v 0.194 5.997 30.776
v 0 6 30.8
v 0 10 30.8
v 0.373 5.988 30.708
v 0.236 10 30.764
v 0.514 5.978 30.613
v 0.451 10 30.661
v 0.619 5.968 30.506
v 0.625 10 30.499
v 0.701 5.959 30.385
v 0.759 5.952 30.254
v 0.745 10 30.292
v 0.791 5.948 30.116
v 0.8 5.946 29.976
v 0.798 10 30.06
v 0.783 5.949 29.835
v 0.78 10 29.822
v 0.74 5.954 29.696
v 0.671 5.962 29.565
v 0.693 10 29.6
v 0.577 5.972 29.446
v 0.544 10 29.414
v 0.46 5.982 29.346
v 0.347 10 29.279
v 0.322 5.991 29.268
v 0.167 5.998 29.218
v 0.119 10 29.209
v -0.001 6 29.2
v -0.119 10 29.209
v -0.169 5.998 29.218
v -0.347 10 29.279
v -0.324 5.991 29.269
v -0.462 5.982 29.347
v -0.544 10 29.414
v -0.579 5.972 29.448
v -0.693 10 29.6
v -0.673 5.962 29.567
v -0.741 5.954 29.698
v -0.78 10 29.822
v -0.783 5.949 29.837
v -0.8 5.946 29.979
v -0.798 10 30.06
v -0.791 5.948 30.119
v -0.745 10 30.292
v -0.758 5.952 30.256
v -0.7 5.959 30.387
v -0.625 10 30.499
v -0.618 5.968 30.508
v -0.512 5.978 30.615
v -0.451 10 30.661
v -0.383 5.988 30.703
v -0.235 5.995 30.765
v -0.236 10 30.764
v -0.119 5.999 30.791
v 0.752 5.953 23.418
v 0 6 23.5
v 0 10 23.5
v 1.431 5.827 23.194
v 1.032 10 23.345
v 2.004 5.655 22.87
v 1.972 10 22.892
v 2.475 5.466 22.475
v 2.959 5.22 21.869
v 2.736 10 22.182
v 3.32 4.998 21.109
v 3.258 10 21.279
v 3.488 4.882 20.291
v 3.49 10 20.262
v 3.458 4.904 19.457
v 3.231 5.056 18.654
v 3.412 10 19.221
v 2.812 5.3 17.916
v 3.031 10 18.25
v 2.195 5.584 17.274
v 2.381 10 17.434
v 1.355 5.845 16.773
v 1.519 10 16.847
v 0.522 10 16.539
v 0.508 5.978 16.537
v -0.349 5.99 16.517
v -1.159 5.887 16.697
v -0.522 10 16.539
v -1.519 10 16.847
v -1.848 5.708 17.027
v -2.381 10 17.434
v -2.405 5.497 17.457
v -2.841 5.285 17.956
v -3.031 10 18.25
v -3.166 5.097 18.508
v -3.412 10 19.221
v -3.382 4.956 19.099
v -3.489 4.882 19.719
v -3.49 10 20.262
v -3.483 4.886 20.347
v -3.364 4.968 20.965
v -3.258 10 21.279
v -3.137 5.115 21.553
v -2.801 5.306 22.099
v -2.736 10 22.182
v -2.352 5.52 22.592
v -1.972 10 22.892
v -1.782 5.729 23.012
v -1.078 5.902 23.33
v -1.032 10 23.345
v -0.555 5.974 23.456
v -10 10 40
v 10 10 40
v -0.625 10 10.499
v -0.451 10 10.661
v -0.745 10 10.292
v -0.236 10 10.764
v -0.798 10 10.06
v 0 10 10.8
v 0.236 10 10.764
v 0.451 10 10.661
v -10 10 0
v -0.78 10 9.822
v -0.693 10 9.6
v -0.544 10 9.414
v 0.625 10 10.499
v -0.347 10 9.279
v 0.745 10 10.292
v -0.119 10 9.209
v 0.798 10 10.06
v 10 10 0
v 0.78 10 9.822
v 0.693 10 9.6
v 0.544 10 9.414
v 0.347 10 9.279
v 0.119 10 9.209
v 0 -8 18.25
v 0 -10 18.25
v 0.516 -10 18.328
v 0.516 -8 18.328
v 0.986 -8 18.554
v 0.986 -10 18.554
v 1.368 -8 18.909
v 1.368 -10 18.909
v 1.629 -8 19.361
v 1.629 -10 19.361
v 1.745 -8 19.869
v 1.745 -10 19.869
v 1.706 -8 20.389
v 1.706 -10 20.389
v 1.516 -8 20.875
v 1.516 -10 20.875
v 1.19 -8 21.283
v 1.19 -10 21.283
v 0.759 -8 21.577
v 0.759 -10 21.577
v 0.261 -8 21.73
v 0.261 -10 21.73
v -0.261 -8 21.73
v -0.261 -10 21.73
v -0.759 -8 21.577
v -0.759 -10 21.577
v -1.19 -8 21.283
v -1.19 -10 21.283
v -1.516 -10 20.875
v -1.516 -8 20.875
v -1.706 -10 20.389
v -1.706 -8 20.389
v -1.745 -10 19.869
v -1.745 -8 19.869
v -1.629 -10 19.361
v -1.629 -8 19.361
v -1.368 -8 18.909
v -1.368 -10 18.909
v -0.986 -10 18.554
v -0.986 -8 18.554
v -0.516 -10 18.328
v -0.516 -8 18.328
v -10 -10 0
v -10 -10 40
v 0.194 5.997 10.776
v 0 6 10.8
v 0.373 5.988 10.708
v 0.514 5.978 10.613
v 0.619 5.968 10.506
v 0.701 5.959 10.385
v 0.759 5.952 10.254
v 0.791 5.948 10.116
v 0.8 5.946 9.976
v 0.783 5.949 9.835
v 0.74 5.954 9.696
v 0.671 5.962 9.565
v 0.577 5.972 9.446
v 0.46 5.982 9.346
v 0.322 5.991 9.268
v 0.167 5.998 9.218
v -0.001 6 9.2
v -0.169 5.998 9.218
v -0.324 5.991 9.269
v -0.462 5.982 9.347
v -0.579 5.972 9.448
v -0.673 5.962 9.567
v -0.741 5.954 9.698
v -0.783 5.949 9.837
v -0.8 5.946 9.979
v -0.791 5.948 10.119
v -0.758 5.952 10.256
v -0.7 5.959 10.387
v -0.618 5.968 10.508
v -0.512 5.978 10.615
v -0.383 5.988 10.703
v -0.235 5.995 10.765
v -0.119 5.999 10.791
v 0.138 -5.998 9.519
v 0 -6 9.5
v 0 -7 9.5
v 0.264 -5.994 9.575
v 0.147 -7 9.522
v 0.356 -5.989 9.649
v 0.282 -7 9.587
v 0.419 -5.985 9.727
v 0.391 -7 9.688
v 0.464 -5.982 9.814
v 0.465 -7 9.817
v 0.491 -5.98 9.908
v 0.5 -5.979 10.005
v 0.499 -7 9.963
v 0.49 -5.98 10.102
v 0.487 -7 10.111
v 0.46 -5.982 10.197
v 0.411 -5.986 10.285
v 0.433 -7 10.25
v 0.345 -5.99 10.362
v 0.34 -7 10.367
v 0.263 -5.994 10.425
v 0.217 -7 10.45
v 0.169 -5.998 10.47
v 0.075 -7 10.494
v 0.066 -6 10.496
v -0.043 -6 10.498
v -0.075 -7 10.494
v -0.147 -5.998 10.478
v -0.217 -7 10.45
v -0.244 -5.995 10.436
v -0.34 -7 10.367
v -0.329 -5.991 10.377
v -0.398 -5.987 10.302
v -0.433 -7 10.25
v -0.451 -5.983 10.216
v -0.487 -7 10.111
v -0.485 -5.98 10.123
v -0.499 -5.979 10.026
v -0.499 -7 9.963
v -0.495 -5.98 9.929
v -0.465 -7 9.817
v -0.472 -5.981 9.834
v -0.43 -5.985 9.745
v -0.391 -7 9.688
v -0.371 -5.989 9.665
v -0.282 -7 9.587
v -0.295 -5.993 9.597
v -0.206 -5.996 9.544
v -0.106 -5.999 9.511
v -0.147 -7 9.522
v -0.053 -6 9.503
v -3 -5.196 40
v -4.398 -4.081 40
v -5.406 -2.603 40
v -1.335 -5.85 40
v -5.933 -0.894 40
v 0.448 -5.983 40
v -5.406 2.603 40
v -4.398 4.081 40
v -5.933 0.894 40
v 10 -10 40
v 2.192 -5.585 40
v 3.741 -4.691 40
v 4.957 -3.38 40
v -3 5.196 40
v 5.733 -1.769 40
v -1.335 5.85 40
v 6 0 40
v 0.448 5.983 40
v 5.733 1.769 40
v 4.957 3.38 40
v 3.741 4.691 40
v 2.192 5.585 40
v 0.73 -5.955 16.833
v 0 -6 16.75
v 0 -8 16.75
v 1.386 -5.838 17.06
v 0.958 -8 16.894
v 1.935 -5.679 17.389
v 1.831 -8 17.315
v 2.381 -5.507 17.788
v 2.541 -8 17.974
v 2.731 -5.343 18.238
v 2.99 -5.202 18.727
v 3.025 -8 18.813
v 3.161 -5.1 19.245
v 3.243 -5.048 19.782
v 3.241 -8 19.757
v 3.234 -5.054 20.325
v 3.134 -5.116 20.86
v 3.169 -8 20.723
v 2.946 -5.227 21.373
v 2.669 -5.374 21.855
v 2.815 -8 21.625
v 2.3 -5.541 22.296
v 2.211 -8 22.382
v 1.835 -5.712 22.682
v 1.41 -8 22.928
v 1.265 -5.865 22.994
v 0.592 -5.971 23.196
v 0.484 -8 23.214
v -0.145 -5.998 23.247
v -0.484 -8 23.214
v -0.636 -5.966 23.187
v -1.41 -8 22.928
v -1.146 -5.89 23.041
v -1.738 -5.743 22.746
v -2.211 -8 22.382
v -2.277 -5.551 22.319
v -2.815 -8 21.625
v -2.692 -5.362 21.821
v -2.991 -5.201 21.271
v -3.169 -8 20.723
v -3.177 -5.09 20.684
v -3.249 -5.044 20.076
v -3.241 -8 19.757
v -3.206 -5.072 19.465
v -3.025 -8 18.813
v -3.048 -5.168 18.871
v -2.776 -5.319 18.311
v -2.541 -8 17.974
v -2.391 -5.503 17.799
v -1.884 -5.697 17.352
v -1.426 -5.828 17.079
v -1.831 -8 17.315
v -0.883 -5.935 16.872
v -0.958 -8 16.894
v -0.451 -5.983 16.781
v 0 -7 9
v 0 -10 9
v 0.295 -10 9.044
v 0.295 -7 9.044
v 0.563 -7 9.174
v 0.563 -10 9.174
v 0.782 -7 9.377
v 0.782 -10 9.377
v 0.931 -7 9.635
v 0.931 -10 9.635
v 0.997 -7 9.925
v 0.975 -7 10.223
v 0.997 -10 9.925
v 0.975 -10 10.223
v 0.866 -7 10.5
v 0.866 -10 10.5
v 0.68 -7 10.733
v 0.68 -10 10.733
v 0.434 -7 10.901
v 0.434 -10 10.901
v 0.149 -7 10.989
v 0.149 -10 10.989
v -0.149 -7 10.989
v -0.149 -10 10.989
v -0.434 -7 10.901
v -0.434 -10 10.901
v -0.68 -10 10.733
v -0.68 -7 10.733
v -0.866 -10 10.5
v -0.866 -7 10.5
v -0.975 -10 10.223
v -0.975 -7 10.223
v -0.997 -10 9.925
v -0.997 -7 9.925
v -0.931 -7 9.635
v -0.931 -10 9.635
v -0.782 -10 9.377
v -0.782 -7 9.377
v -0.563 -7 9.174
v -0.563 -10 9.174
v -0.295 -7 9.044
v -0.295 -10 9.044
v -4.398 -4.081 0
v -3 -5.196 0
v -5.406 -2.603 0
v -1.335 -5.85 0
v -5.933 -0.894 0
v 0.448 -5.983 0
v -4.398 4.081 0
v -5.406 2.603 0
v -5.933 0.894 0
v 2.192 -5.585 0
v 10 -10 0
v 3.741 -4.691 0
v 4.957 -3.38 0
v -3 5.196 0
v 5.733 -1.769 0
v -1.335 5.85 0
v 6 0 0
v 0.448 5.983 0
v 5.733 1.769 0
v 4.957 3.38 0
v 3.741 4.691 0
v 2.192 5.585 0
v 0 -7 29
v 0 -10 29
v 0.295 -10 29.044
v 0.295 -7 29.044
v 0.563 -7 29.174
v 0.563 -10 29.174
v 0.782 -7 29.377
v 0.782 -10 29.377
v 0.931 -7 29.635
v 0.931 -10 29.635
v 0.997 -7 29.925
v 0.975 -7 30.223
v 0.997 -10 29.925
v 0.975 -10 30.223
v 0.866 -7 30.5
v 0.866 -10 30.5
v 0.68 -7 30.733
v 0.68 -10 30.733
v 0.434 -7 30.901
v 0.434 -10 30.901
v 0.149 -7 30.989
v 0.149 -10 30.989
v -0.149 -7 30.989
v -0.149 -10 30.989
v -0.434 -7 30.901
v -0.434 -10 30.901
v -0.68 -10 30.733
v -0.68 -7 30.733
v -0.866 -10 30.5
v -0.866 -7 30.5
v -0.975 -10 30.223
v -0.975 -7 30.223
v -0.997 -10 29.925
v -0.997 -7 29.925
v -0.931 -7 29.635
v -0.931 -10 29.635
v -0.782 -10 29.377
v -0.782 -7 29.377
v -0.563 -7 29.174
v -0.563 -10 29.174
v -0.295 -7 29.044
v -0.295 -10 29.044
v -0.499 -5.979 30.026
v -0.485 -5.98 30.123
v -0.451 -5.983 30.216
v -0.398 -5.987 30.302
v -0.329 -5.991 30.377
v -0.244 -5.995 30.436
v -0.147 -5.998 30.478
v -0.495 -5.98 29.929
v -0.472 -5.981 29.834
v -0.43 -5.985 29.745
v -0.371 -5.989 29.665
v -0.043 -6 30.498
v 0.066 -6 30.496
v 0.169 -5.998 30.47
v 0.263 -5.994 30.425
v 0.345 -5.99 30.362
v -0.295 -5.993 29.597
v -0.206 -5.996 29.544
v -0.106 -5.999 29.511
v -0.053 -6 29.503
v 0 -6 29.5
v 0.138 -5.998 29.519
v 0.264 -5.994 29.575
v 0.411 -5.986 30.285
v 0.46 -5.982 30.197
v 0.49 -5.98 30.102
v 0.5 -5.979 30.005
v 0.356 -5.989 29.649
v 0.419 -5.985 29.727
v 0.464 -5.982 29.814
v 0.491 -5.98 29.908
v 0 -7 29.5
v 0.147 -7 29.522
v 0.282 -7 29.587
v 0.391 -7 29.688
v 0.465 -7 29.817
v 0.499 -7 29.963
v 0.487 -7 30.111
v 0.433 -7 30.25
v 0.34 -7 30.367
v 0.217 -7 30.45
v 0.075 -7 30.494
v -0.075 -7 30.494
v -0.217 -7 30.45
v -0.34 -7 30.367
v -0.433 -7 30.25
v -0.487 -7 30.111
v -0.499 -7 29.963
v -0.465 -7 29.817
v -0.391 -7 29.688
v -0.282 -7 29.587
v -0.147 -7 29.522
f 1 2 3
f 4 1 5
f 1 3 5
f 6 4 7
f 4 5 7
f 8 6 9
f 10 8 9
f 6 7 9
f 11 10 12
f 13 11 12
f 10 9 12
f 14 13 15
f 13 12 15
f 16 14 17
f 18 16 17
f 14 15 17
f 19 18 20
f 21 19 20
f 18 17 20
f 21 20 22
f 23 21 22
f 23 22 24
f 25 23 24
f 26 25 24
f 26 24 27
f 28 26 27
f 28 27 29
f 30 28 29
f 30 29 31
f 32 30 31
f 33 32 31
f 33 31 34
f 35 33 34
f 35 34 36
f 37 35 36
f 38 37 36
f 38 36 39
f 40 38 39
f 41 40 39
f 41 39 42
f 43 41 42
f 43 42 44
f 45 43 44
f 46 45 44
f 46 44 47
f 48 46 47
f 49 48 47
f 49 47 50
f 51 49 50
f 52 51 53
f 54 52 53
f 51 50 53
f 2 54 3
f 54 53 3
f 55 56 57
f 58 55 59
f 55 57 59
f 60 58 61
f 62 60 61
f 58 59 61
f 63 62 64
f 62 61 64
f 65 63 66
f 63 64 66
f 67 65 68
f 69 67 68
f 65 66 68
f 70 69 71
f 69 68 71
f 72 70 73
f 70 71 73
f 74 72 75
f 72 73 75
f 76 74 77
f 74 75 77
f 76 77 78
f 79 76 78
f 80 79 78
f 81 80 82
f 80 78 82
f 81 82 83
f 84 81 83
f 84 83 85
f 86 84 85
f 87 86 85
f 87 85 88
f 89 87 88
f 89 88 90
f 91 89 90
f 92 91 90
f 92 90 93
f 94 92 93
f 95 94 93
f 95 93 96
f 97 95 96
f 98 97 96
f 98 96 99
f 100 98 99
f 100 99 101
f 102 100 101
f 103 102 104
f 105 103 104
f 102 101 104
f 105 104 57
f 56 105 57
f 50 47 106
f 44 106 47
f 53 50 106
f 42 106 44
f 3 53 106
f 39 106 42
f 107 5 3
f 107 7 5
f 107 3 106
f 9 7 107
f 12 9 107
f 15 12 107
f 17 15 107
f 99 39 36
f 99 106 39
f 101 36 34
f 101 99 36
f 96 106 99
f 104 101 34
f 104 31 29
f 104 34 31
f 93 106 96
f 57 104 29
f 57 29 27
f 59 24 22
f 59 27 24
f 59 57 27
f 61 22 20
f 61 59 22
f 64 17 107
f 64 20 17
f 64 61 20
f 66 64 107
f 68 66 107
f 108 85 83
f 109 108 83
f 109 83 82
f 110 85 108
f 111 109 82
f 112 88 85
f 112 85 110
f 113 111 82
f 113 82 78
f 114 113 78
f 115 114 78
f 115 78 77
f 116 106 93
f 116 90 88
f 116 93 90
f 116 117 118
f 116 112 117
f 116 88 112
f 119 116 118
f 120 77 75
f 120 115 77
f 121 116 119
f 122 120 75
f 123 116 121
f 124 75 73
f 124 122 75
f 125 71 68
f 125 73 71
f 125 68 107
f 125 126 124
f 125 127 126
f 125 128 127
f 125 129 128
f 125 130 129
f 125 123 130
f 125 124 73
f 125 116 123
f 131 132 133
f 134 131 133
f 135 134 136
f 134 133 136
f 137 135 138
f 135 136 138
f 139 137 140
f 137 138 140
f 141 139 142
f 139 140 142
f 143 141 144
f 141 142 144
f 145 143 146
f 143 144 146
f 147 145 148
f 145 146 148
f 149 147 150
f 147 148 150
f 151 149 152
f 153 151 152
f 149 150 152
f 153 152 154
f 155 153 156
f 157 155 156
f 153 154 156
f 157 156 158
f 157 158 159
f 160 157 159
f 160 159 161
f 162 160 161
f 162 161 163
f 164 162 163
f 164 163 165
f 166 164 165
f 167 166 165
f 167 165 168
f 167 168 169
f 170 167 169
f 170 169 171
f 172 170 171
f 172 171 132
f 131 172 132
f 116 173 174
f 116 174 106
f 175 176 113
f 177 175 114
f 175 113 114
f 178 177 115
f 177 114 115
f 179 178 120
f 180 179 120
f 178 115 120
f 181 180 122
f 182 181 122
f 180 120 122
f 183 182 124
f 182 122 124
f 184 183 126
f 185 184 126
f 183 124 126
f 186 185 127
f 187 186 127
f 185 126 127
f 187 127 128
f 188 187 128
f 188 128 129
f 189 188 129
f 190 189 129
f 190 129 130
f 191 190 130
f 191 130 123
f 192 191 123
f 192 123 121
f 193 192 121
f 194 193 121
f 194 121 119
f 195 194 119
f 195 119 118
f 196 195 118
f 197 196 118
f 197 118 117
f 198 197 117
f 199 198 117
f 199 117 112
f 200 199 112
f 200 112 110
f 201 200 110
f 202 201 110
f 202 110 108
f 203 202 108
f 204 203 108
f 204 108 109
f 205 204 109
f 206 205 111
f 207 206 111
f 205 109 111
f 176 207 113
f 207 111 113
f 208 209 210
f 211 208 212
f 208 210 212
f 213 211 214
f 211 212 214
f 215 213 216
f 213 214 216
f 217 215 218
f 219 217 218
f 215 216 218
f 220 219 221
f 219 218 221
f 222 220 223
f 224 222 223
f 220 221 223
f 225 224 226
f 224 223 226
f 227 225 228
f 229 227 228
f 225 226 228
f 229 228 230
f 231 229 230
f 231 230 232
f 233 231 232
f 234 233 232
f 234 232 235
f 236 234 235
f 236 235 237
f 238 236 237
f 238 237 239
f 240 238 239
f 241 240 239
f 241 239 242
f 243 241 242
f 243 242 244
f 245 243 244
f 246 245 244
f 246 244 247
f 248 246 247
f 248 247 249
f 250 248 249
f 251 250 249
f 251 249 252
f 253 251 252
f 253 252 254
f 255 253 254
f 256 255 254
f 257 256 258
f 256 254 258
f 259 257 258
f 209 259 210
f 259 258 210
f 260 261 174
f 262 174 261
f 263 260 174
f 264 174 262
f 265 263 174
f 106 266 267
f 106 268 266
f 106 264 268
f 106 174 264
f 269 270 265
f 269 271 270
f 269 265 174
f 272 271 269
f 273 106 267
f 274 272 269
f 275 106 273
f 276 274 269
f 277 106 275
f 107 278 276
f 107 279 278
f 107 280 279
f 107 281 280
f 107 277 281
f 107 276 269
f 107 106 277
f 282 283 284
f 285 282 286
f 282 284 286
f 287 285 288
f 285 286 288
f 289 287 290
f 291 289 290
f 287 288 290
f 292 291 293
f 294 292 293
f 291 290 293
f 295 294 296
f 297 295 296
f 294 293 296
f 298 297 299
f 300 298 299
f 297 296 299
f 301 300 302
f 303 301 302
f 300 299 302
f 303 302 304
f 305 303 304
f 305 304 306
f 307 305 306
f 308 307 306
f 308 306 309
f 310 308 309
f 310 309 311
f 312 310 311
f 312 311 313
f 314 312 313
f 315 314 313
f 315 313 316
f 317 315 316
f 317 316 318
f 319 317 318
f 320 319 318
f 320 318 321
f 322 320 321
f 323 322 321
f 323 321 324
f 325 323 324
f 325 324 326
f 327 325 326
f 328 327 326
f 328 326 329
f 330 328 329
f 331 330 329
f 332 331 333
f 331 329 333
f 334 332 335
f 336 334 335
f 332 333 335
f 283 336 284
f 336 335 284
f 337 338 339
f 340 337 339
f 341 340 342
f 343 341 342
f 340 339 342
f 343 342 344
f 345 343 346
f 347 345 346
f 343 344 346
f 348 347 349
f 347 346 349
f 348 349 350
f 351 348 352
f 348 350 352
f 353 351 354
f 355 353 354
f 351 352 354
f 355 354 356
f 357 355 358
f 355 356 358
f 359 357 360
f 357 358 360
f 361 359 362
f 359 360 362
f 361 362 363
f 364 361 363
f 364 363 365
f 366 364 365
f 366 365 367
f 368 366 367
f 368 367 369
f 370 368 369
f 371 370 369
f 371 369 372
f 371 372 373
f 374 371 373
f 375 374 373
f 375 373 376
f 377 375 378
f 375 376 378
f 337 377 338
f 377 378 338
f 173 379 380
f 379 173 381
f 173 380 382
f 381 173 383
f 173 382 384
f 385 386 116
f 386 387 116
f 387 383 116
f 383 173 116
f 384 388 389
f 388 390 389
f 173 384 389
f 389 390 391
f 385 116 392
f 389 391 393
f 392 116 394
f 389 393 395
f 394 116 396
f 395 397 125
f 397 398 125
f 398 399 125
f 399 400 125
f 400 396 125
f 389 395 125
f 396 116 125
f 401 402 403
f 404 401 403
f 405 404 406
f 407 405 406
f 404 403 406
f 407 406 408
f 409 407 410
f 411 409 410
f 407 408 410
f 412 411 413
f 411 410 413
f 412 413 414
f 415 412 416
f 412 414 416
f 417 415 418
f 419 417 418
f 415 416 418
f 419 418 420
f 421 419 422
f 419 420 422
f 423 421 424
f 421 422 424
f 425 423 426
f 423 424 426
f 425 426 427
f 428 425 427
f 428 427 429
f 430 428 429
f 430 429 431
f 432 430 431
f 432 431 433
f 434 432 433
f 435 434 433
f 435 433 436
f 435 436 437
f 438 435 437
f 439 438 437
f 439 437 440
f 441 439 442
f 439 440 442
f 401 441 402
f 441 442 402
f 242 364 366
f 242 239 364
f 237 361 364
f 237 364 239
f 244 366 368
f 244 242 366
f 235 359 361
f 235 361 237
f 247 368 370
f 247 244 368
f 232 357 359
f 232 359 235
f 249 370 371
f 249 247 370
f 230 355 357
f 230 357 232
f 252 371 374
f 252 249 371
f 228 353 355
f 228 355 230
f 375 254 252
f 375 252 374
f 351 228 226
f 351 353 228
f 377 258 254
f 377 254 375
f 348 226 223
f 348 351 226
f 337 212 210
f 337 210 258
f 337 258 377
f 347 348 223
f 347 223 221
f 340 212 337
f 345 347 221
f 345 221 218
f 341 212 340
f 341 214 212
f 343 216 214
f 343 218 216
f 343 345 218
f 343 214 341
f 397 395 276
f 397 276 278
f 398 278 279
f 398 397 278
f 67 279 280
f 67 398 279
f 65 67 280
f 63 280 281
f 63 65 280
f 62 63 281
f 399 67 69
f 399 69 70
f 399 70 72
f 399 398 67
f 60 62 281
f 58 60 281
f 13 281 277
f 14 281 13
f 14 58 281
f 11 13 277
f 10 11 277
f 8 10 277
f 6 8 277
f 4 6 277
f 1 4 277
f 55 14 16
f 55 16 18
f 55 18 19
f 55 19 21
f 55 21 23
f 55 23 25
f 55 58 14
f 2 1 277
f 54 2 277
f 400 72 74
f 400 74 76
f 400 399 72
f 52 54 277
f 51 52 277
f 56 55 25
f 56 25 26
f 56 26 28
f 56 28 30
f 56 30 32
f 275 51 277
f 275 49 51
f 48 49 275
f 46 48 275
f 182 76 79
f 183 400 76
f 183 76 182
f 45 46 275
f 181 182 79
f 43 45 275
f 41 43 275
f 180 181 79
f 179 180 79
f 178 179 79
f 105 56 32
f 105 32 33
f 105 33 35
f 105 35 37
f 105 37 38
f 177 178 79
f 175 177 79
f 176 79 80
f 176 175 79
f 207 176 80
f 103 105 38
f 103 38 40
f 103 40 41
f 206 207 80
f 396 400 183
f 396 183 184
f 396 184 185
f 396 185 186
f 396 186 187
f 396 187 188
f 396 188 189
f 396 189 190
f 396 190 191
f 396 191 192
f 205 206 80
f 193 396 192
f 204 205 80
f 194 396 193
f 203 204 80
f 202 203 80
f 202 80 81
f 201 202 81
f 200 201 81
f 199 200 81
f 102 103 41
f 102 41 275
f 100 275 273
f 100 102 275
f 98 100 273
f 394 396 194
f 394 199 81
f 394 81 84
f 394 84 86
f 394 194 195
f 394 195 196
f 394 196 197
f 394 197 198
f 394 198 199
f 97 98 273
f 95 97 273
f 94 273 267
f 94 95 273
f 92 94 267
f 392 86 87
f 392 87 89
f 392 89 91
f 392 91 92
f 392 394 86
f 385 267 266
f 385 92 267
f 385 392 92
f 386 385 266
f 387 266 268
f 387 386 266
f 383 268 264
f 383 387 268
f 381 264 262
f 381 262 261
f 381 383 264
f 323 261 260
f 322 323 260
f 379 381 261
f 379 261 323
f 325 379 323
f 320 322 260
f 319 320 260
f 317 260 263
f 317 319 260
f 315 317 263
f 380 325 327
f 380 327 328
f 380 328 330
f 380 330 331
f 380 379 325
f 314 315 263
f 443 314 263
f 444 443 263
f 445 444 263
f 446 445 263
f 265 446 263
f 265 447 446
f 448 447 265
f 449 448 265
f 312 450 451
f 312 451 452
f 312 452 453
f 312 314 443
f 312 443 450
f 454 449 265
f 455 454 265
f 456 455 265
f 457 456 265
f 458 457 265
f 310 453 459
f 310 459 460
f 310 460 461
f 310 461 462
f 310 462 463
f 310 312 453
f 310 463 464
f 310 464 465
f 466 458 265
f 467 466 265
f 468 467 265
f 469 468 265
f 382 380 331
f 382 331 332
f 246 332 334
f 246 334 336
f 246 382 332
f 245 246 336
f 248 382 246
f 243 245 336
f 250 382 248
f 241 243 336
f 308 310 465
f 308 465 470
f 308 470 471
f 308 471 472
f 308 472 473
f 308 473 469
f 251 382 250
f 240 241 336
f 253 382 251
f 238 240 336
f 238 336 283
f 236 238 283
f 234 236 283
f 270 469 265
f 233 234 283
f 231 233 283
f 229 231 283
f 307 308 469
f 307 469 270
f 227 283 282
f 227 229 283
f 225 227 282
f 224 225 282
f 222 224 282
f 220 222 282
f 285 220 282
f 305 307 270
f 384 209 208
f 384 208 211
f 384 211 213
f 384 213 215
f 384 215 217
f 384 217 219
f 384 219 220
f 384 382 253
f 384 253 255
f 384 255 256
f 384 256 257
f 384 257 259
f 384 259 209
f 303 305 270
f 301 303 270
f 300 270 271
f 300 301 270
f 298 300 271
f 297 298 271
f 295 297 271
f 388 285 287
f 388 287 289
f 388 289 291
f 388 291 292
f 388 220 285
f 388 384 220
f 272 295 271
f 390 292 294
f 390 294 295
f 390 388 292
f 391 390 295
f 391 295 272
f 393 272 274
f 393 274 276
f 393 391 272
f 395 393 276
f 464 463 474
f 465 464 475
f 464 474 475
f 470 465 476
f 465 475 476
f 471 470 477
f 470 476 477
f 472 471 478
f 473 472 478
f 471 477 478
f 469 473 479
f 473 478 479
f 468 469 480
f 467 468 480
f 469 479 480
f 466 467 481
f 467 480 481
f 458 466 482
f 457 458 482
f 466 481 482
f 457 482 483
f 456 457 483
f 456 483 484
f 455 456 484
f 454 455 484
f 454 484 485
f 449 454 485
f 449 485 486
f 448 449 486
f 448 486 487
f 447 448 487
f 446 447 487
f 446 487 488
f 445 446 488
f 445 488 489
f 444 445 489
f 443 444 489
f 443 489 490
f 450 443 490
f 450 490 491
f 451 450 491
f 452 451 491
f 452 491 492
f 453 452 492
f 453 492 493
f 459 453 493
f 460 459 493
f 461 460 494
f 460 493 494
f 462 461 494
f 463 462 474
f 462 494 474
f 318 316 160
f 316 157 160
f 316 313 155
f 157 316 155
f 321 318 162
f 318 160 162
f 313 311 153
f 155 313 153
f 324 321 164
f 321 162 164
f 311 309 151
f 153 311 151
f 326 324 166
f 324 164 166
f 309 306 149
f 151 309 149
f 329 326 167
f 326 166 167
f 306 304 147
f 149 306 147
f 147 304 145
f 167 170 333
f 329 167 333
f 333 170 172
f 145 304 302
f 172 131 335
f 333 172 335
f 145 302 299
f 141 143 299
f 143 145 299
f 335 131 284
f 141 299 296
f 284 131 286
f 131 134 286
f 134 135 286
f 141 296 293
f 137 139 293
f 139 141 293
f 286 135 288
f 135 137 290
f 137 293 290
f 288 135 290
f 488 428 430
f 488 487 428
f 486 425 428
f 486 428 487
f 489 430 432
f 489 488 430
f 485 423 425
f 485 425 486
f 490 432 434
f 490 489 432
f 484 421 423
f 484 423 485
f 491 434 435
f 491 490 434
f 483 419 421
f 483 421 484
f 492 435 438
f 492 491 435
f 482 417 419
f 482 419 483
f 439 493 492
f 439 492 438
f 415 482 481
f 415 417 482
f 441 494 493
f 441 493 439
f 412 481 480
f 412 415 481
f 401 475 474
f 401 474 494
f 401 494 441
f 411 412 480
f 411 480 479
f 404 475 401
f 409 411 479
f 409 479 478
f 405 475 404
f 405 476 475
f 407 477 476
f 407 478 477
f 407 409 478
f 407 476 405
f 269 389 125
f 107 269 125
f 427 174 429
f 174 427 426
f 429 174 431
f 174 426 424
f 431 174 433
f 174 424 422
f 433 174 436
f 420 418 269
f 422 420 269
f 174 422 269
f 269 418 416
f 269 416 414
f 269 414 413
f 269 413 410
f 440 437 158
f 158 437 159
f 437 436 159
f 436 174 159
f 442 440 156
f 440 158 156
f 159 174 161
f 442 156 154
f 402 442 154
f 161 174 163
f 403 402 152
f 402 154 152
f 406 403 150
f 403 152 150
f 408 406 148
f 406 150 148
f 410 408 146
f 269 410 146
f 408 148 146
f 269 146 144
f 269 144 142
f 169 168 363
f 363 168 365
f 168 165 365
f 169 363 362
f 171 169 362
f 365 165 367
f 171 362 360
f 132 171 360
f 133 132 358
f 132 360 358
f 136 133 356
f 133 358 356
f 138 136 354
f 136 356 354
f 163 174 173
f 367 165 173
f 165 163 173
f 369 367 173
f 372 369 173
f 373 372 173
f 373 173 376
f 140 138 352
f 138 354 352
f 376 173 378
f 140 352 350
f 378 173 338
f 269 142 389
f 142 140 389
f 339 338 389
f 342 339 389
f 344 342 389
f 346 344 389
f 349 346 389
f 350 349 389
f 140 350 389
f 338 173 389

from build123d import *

# Parameters (mm, degrees)
SKIZZE1_W                            = 20
SKIZZE1_H                            = 20
SKIZZE1_R                            = 6
AUFSATZ_LINEAR_AUSTRAGEN1_DEPTH      = 40
SKIZZE2_R                            = 1
SKIZZE2_R_2                          = 1.75
SCHNITT_LINEAR_AUSTRAGEN1_DEPTH      = 3
SKIZZE3_R                            = 0.5
SCHNITT_LINEAR_AUSTRAGEN2_DEPTH      = 2
SCHNITT_LINEAR_AUSTRAGEN3_REACH      = 46.989
SCHNITT_LINEAR_AUSTRAGEN3_END_RADIUS = 6
SKIZZE4_R                            = 3.25
F_7_0_7_DURCHMESSER_BOHRUNG1_REACH   = 32
F_7_0_7_DURCHMESSER_BOHRUNG1_BORE_R  = 3.5
M2_GEWINDEBOHRUNG1_REACH             = 39.417
M2_GEWINDEBOHRUNG1_BORE_R            = 0.8


with BuildPart() as part:
    # Skizze1 → Aufsatz-Linear austragen1 (new body)
    with BuildSketch(Plane.XY):
        Rectangle(SKIZZE1_W, SKIZZE1_H)
        Circle(SKIZZE1_R, mode=Mode.SUBTRACT)
    extrude(amount=AUFSATZ_LINEAR_AUSTRAGEN1_DEPTH)

    # Skizze2 → Schnitt-Linear austragen1 (cut)
    with BuildSketch(Plane.XZ.offset(10)):
        with Locations(Location((0, 30, 0), (0, 0, 270))):
            Circle(SKIZZE2_R)
        with Locations(Location((0, 10, 0), (0, 0, 270))):
            Circle(SKIZZE2_R)
        with Locations(Location((0, 20, 0), (0, 0, 270))):
            Circle(SKIZZE2_R_2)
    extrude(amount=-SCHNITT_LINEAR_AUSTRAGEN1_DEPTH, mode=Mode.SUBTRACT)

    # Skizze3 → Schnitt-Linear austragen2 (cut)
    with BuildSketch(Plane.XZ.offset(7)):
        with Locations(Location((0, 30, 0), (0, 0, 270))):
            Circle(SKIZZE3_R)
        with Locations(Location((0, 10, 0), (0, 0, 270))):
            Circle(SKIZZE3_R)
    extrude(amount=-SCHNITT_LINEAR_AUSTRAGEN2_DEPTH, mode=Mode.SUBTRACT)

    # Schnitt-Linear austragen3: up to this cylinder (the profile starts outside it)
    schnitt_linear_austragen3_end = Plane(origin=(0, 0, 20), z_dir=(0, 0, -1)) * Cylinder(SCHNITT_LINEAR_AUSTRAGEN3_END_RADIUS, 106.978, mode=Mode.PRIVATE)
    # Skizze4 → Schnitt-Linear austragen3 (cut, up to the surface)
    with BuildSketch(Plane(origin=(0, -8, 0), x_dir=(-1, 0, 0), z_dir=(0, -1, 0)), mode=Mode.PRIVATE) as schnitt_linear_austragen3_sk1:
        with Locations(Location((0, -20, 0), (0, 0, 90))):
            Circle(SKIZZE4_R)
    schnitt_linear_austragen3_tool1 = extrude(schnitt_linear_austragen3_sk1.sketch, amount=-SCHNITT_LINEAR_AUSTRAGEN3_REACH, mode=Mode.PRIVATE) - schnitt_linear_austragen3_end
    add(schnitt_linear_austragen3_tool1.solids().sort_by_distance((0, -8, 20))[0], mode=Mode.SUBTRACT)

    # Ø7.0 (7) Durchmesser Bohrung1 bore (on position points) → Ø7.0 (7) Durchmesser Bohrung1 (cut, up to next)
    with BuildSketch(Plane(origin=(0, 10, 20), x_dir=(0, 0, 1), z_dir=(0, 1, 0)), mode=Mode.PRIVATE) as f_7_0_7_durchmesser_bohrung1_sk1:
        Circle(F_7_0_7_DURCHMESSER_BOHRUNG1_BORE_R)
    f_7_0_7_durchmesser_bohrung1_tool1 = extrude(f_7_0_7_durchmesser_bohrung1_sk1.sketch, amount=-F_7_0_7_DURCHMESSER_BOHRUNG1_REACH, mode=Mode.PRIVATE) & part.part
    add(f_7_0_7_durchmesser_bohrung1_tool1.solids().sort_by_distance((0, 10, 20))[0], mode=Mode.SUBTRACT)

    # M2 Gewindebohrung1 bore (on position points) → M2 Gewindebohrung1 (cut, up to next)
    with BuildSketch(Plane(origin=(0, 10, 30), x_dir=(0, 0, 1), z_dir=(0, 1, 0)), mode=Mode.PRIVATE) as m2_gewindebohrung1_sk1:
        Circle(M2_GEWINDEBOHRUNG1_BORE_R)
    m2_gewindebohrung1_tool1 = extrude(m2_gewindebohrung1_sk1.sketch, amount=-M2_GEWINDEBOHRUNG1_REACH, mode=Mode.PRIVATE) & part.part
    # M2 Gewindebohrung1 bore (on position points) → M2 Gewindebohrung1 (cut, up to next)
    with BuildSketch(Plane(origin=(0, 10, 30), x_dir=(0, 0, 1), z_dir=(0, 1, 0)), mode=Mode.PRIVATE) as m2_gewindebohrung1_sk2:
        with Locations((-20, 0)):
            Circle(M2_GEWINDEBOHRUNG1_BORE_R)
    m2_gewindebohrung1_tool2 = extrude(m2_gewindebohrung1_sk2.sketch, amount=-M2_GEWINDEBOHRUNG1_REACH, mode=Mode.PRIVATE) & part.part
    add(m2_gewindebohrung1_tool1.solids().sort_by_distance((0, 10, 30))[0], mode=Mode.SUBTRACT)
    add(m2_gewindebohrung1_tool2.solids().sort_by_distance((0, 10, 10))[0], mode=Mode.SUBTRACT)


solid = part.part
